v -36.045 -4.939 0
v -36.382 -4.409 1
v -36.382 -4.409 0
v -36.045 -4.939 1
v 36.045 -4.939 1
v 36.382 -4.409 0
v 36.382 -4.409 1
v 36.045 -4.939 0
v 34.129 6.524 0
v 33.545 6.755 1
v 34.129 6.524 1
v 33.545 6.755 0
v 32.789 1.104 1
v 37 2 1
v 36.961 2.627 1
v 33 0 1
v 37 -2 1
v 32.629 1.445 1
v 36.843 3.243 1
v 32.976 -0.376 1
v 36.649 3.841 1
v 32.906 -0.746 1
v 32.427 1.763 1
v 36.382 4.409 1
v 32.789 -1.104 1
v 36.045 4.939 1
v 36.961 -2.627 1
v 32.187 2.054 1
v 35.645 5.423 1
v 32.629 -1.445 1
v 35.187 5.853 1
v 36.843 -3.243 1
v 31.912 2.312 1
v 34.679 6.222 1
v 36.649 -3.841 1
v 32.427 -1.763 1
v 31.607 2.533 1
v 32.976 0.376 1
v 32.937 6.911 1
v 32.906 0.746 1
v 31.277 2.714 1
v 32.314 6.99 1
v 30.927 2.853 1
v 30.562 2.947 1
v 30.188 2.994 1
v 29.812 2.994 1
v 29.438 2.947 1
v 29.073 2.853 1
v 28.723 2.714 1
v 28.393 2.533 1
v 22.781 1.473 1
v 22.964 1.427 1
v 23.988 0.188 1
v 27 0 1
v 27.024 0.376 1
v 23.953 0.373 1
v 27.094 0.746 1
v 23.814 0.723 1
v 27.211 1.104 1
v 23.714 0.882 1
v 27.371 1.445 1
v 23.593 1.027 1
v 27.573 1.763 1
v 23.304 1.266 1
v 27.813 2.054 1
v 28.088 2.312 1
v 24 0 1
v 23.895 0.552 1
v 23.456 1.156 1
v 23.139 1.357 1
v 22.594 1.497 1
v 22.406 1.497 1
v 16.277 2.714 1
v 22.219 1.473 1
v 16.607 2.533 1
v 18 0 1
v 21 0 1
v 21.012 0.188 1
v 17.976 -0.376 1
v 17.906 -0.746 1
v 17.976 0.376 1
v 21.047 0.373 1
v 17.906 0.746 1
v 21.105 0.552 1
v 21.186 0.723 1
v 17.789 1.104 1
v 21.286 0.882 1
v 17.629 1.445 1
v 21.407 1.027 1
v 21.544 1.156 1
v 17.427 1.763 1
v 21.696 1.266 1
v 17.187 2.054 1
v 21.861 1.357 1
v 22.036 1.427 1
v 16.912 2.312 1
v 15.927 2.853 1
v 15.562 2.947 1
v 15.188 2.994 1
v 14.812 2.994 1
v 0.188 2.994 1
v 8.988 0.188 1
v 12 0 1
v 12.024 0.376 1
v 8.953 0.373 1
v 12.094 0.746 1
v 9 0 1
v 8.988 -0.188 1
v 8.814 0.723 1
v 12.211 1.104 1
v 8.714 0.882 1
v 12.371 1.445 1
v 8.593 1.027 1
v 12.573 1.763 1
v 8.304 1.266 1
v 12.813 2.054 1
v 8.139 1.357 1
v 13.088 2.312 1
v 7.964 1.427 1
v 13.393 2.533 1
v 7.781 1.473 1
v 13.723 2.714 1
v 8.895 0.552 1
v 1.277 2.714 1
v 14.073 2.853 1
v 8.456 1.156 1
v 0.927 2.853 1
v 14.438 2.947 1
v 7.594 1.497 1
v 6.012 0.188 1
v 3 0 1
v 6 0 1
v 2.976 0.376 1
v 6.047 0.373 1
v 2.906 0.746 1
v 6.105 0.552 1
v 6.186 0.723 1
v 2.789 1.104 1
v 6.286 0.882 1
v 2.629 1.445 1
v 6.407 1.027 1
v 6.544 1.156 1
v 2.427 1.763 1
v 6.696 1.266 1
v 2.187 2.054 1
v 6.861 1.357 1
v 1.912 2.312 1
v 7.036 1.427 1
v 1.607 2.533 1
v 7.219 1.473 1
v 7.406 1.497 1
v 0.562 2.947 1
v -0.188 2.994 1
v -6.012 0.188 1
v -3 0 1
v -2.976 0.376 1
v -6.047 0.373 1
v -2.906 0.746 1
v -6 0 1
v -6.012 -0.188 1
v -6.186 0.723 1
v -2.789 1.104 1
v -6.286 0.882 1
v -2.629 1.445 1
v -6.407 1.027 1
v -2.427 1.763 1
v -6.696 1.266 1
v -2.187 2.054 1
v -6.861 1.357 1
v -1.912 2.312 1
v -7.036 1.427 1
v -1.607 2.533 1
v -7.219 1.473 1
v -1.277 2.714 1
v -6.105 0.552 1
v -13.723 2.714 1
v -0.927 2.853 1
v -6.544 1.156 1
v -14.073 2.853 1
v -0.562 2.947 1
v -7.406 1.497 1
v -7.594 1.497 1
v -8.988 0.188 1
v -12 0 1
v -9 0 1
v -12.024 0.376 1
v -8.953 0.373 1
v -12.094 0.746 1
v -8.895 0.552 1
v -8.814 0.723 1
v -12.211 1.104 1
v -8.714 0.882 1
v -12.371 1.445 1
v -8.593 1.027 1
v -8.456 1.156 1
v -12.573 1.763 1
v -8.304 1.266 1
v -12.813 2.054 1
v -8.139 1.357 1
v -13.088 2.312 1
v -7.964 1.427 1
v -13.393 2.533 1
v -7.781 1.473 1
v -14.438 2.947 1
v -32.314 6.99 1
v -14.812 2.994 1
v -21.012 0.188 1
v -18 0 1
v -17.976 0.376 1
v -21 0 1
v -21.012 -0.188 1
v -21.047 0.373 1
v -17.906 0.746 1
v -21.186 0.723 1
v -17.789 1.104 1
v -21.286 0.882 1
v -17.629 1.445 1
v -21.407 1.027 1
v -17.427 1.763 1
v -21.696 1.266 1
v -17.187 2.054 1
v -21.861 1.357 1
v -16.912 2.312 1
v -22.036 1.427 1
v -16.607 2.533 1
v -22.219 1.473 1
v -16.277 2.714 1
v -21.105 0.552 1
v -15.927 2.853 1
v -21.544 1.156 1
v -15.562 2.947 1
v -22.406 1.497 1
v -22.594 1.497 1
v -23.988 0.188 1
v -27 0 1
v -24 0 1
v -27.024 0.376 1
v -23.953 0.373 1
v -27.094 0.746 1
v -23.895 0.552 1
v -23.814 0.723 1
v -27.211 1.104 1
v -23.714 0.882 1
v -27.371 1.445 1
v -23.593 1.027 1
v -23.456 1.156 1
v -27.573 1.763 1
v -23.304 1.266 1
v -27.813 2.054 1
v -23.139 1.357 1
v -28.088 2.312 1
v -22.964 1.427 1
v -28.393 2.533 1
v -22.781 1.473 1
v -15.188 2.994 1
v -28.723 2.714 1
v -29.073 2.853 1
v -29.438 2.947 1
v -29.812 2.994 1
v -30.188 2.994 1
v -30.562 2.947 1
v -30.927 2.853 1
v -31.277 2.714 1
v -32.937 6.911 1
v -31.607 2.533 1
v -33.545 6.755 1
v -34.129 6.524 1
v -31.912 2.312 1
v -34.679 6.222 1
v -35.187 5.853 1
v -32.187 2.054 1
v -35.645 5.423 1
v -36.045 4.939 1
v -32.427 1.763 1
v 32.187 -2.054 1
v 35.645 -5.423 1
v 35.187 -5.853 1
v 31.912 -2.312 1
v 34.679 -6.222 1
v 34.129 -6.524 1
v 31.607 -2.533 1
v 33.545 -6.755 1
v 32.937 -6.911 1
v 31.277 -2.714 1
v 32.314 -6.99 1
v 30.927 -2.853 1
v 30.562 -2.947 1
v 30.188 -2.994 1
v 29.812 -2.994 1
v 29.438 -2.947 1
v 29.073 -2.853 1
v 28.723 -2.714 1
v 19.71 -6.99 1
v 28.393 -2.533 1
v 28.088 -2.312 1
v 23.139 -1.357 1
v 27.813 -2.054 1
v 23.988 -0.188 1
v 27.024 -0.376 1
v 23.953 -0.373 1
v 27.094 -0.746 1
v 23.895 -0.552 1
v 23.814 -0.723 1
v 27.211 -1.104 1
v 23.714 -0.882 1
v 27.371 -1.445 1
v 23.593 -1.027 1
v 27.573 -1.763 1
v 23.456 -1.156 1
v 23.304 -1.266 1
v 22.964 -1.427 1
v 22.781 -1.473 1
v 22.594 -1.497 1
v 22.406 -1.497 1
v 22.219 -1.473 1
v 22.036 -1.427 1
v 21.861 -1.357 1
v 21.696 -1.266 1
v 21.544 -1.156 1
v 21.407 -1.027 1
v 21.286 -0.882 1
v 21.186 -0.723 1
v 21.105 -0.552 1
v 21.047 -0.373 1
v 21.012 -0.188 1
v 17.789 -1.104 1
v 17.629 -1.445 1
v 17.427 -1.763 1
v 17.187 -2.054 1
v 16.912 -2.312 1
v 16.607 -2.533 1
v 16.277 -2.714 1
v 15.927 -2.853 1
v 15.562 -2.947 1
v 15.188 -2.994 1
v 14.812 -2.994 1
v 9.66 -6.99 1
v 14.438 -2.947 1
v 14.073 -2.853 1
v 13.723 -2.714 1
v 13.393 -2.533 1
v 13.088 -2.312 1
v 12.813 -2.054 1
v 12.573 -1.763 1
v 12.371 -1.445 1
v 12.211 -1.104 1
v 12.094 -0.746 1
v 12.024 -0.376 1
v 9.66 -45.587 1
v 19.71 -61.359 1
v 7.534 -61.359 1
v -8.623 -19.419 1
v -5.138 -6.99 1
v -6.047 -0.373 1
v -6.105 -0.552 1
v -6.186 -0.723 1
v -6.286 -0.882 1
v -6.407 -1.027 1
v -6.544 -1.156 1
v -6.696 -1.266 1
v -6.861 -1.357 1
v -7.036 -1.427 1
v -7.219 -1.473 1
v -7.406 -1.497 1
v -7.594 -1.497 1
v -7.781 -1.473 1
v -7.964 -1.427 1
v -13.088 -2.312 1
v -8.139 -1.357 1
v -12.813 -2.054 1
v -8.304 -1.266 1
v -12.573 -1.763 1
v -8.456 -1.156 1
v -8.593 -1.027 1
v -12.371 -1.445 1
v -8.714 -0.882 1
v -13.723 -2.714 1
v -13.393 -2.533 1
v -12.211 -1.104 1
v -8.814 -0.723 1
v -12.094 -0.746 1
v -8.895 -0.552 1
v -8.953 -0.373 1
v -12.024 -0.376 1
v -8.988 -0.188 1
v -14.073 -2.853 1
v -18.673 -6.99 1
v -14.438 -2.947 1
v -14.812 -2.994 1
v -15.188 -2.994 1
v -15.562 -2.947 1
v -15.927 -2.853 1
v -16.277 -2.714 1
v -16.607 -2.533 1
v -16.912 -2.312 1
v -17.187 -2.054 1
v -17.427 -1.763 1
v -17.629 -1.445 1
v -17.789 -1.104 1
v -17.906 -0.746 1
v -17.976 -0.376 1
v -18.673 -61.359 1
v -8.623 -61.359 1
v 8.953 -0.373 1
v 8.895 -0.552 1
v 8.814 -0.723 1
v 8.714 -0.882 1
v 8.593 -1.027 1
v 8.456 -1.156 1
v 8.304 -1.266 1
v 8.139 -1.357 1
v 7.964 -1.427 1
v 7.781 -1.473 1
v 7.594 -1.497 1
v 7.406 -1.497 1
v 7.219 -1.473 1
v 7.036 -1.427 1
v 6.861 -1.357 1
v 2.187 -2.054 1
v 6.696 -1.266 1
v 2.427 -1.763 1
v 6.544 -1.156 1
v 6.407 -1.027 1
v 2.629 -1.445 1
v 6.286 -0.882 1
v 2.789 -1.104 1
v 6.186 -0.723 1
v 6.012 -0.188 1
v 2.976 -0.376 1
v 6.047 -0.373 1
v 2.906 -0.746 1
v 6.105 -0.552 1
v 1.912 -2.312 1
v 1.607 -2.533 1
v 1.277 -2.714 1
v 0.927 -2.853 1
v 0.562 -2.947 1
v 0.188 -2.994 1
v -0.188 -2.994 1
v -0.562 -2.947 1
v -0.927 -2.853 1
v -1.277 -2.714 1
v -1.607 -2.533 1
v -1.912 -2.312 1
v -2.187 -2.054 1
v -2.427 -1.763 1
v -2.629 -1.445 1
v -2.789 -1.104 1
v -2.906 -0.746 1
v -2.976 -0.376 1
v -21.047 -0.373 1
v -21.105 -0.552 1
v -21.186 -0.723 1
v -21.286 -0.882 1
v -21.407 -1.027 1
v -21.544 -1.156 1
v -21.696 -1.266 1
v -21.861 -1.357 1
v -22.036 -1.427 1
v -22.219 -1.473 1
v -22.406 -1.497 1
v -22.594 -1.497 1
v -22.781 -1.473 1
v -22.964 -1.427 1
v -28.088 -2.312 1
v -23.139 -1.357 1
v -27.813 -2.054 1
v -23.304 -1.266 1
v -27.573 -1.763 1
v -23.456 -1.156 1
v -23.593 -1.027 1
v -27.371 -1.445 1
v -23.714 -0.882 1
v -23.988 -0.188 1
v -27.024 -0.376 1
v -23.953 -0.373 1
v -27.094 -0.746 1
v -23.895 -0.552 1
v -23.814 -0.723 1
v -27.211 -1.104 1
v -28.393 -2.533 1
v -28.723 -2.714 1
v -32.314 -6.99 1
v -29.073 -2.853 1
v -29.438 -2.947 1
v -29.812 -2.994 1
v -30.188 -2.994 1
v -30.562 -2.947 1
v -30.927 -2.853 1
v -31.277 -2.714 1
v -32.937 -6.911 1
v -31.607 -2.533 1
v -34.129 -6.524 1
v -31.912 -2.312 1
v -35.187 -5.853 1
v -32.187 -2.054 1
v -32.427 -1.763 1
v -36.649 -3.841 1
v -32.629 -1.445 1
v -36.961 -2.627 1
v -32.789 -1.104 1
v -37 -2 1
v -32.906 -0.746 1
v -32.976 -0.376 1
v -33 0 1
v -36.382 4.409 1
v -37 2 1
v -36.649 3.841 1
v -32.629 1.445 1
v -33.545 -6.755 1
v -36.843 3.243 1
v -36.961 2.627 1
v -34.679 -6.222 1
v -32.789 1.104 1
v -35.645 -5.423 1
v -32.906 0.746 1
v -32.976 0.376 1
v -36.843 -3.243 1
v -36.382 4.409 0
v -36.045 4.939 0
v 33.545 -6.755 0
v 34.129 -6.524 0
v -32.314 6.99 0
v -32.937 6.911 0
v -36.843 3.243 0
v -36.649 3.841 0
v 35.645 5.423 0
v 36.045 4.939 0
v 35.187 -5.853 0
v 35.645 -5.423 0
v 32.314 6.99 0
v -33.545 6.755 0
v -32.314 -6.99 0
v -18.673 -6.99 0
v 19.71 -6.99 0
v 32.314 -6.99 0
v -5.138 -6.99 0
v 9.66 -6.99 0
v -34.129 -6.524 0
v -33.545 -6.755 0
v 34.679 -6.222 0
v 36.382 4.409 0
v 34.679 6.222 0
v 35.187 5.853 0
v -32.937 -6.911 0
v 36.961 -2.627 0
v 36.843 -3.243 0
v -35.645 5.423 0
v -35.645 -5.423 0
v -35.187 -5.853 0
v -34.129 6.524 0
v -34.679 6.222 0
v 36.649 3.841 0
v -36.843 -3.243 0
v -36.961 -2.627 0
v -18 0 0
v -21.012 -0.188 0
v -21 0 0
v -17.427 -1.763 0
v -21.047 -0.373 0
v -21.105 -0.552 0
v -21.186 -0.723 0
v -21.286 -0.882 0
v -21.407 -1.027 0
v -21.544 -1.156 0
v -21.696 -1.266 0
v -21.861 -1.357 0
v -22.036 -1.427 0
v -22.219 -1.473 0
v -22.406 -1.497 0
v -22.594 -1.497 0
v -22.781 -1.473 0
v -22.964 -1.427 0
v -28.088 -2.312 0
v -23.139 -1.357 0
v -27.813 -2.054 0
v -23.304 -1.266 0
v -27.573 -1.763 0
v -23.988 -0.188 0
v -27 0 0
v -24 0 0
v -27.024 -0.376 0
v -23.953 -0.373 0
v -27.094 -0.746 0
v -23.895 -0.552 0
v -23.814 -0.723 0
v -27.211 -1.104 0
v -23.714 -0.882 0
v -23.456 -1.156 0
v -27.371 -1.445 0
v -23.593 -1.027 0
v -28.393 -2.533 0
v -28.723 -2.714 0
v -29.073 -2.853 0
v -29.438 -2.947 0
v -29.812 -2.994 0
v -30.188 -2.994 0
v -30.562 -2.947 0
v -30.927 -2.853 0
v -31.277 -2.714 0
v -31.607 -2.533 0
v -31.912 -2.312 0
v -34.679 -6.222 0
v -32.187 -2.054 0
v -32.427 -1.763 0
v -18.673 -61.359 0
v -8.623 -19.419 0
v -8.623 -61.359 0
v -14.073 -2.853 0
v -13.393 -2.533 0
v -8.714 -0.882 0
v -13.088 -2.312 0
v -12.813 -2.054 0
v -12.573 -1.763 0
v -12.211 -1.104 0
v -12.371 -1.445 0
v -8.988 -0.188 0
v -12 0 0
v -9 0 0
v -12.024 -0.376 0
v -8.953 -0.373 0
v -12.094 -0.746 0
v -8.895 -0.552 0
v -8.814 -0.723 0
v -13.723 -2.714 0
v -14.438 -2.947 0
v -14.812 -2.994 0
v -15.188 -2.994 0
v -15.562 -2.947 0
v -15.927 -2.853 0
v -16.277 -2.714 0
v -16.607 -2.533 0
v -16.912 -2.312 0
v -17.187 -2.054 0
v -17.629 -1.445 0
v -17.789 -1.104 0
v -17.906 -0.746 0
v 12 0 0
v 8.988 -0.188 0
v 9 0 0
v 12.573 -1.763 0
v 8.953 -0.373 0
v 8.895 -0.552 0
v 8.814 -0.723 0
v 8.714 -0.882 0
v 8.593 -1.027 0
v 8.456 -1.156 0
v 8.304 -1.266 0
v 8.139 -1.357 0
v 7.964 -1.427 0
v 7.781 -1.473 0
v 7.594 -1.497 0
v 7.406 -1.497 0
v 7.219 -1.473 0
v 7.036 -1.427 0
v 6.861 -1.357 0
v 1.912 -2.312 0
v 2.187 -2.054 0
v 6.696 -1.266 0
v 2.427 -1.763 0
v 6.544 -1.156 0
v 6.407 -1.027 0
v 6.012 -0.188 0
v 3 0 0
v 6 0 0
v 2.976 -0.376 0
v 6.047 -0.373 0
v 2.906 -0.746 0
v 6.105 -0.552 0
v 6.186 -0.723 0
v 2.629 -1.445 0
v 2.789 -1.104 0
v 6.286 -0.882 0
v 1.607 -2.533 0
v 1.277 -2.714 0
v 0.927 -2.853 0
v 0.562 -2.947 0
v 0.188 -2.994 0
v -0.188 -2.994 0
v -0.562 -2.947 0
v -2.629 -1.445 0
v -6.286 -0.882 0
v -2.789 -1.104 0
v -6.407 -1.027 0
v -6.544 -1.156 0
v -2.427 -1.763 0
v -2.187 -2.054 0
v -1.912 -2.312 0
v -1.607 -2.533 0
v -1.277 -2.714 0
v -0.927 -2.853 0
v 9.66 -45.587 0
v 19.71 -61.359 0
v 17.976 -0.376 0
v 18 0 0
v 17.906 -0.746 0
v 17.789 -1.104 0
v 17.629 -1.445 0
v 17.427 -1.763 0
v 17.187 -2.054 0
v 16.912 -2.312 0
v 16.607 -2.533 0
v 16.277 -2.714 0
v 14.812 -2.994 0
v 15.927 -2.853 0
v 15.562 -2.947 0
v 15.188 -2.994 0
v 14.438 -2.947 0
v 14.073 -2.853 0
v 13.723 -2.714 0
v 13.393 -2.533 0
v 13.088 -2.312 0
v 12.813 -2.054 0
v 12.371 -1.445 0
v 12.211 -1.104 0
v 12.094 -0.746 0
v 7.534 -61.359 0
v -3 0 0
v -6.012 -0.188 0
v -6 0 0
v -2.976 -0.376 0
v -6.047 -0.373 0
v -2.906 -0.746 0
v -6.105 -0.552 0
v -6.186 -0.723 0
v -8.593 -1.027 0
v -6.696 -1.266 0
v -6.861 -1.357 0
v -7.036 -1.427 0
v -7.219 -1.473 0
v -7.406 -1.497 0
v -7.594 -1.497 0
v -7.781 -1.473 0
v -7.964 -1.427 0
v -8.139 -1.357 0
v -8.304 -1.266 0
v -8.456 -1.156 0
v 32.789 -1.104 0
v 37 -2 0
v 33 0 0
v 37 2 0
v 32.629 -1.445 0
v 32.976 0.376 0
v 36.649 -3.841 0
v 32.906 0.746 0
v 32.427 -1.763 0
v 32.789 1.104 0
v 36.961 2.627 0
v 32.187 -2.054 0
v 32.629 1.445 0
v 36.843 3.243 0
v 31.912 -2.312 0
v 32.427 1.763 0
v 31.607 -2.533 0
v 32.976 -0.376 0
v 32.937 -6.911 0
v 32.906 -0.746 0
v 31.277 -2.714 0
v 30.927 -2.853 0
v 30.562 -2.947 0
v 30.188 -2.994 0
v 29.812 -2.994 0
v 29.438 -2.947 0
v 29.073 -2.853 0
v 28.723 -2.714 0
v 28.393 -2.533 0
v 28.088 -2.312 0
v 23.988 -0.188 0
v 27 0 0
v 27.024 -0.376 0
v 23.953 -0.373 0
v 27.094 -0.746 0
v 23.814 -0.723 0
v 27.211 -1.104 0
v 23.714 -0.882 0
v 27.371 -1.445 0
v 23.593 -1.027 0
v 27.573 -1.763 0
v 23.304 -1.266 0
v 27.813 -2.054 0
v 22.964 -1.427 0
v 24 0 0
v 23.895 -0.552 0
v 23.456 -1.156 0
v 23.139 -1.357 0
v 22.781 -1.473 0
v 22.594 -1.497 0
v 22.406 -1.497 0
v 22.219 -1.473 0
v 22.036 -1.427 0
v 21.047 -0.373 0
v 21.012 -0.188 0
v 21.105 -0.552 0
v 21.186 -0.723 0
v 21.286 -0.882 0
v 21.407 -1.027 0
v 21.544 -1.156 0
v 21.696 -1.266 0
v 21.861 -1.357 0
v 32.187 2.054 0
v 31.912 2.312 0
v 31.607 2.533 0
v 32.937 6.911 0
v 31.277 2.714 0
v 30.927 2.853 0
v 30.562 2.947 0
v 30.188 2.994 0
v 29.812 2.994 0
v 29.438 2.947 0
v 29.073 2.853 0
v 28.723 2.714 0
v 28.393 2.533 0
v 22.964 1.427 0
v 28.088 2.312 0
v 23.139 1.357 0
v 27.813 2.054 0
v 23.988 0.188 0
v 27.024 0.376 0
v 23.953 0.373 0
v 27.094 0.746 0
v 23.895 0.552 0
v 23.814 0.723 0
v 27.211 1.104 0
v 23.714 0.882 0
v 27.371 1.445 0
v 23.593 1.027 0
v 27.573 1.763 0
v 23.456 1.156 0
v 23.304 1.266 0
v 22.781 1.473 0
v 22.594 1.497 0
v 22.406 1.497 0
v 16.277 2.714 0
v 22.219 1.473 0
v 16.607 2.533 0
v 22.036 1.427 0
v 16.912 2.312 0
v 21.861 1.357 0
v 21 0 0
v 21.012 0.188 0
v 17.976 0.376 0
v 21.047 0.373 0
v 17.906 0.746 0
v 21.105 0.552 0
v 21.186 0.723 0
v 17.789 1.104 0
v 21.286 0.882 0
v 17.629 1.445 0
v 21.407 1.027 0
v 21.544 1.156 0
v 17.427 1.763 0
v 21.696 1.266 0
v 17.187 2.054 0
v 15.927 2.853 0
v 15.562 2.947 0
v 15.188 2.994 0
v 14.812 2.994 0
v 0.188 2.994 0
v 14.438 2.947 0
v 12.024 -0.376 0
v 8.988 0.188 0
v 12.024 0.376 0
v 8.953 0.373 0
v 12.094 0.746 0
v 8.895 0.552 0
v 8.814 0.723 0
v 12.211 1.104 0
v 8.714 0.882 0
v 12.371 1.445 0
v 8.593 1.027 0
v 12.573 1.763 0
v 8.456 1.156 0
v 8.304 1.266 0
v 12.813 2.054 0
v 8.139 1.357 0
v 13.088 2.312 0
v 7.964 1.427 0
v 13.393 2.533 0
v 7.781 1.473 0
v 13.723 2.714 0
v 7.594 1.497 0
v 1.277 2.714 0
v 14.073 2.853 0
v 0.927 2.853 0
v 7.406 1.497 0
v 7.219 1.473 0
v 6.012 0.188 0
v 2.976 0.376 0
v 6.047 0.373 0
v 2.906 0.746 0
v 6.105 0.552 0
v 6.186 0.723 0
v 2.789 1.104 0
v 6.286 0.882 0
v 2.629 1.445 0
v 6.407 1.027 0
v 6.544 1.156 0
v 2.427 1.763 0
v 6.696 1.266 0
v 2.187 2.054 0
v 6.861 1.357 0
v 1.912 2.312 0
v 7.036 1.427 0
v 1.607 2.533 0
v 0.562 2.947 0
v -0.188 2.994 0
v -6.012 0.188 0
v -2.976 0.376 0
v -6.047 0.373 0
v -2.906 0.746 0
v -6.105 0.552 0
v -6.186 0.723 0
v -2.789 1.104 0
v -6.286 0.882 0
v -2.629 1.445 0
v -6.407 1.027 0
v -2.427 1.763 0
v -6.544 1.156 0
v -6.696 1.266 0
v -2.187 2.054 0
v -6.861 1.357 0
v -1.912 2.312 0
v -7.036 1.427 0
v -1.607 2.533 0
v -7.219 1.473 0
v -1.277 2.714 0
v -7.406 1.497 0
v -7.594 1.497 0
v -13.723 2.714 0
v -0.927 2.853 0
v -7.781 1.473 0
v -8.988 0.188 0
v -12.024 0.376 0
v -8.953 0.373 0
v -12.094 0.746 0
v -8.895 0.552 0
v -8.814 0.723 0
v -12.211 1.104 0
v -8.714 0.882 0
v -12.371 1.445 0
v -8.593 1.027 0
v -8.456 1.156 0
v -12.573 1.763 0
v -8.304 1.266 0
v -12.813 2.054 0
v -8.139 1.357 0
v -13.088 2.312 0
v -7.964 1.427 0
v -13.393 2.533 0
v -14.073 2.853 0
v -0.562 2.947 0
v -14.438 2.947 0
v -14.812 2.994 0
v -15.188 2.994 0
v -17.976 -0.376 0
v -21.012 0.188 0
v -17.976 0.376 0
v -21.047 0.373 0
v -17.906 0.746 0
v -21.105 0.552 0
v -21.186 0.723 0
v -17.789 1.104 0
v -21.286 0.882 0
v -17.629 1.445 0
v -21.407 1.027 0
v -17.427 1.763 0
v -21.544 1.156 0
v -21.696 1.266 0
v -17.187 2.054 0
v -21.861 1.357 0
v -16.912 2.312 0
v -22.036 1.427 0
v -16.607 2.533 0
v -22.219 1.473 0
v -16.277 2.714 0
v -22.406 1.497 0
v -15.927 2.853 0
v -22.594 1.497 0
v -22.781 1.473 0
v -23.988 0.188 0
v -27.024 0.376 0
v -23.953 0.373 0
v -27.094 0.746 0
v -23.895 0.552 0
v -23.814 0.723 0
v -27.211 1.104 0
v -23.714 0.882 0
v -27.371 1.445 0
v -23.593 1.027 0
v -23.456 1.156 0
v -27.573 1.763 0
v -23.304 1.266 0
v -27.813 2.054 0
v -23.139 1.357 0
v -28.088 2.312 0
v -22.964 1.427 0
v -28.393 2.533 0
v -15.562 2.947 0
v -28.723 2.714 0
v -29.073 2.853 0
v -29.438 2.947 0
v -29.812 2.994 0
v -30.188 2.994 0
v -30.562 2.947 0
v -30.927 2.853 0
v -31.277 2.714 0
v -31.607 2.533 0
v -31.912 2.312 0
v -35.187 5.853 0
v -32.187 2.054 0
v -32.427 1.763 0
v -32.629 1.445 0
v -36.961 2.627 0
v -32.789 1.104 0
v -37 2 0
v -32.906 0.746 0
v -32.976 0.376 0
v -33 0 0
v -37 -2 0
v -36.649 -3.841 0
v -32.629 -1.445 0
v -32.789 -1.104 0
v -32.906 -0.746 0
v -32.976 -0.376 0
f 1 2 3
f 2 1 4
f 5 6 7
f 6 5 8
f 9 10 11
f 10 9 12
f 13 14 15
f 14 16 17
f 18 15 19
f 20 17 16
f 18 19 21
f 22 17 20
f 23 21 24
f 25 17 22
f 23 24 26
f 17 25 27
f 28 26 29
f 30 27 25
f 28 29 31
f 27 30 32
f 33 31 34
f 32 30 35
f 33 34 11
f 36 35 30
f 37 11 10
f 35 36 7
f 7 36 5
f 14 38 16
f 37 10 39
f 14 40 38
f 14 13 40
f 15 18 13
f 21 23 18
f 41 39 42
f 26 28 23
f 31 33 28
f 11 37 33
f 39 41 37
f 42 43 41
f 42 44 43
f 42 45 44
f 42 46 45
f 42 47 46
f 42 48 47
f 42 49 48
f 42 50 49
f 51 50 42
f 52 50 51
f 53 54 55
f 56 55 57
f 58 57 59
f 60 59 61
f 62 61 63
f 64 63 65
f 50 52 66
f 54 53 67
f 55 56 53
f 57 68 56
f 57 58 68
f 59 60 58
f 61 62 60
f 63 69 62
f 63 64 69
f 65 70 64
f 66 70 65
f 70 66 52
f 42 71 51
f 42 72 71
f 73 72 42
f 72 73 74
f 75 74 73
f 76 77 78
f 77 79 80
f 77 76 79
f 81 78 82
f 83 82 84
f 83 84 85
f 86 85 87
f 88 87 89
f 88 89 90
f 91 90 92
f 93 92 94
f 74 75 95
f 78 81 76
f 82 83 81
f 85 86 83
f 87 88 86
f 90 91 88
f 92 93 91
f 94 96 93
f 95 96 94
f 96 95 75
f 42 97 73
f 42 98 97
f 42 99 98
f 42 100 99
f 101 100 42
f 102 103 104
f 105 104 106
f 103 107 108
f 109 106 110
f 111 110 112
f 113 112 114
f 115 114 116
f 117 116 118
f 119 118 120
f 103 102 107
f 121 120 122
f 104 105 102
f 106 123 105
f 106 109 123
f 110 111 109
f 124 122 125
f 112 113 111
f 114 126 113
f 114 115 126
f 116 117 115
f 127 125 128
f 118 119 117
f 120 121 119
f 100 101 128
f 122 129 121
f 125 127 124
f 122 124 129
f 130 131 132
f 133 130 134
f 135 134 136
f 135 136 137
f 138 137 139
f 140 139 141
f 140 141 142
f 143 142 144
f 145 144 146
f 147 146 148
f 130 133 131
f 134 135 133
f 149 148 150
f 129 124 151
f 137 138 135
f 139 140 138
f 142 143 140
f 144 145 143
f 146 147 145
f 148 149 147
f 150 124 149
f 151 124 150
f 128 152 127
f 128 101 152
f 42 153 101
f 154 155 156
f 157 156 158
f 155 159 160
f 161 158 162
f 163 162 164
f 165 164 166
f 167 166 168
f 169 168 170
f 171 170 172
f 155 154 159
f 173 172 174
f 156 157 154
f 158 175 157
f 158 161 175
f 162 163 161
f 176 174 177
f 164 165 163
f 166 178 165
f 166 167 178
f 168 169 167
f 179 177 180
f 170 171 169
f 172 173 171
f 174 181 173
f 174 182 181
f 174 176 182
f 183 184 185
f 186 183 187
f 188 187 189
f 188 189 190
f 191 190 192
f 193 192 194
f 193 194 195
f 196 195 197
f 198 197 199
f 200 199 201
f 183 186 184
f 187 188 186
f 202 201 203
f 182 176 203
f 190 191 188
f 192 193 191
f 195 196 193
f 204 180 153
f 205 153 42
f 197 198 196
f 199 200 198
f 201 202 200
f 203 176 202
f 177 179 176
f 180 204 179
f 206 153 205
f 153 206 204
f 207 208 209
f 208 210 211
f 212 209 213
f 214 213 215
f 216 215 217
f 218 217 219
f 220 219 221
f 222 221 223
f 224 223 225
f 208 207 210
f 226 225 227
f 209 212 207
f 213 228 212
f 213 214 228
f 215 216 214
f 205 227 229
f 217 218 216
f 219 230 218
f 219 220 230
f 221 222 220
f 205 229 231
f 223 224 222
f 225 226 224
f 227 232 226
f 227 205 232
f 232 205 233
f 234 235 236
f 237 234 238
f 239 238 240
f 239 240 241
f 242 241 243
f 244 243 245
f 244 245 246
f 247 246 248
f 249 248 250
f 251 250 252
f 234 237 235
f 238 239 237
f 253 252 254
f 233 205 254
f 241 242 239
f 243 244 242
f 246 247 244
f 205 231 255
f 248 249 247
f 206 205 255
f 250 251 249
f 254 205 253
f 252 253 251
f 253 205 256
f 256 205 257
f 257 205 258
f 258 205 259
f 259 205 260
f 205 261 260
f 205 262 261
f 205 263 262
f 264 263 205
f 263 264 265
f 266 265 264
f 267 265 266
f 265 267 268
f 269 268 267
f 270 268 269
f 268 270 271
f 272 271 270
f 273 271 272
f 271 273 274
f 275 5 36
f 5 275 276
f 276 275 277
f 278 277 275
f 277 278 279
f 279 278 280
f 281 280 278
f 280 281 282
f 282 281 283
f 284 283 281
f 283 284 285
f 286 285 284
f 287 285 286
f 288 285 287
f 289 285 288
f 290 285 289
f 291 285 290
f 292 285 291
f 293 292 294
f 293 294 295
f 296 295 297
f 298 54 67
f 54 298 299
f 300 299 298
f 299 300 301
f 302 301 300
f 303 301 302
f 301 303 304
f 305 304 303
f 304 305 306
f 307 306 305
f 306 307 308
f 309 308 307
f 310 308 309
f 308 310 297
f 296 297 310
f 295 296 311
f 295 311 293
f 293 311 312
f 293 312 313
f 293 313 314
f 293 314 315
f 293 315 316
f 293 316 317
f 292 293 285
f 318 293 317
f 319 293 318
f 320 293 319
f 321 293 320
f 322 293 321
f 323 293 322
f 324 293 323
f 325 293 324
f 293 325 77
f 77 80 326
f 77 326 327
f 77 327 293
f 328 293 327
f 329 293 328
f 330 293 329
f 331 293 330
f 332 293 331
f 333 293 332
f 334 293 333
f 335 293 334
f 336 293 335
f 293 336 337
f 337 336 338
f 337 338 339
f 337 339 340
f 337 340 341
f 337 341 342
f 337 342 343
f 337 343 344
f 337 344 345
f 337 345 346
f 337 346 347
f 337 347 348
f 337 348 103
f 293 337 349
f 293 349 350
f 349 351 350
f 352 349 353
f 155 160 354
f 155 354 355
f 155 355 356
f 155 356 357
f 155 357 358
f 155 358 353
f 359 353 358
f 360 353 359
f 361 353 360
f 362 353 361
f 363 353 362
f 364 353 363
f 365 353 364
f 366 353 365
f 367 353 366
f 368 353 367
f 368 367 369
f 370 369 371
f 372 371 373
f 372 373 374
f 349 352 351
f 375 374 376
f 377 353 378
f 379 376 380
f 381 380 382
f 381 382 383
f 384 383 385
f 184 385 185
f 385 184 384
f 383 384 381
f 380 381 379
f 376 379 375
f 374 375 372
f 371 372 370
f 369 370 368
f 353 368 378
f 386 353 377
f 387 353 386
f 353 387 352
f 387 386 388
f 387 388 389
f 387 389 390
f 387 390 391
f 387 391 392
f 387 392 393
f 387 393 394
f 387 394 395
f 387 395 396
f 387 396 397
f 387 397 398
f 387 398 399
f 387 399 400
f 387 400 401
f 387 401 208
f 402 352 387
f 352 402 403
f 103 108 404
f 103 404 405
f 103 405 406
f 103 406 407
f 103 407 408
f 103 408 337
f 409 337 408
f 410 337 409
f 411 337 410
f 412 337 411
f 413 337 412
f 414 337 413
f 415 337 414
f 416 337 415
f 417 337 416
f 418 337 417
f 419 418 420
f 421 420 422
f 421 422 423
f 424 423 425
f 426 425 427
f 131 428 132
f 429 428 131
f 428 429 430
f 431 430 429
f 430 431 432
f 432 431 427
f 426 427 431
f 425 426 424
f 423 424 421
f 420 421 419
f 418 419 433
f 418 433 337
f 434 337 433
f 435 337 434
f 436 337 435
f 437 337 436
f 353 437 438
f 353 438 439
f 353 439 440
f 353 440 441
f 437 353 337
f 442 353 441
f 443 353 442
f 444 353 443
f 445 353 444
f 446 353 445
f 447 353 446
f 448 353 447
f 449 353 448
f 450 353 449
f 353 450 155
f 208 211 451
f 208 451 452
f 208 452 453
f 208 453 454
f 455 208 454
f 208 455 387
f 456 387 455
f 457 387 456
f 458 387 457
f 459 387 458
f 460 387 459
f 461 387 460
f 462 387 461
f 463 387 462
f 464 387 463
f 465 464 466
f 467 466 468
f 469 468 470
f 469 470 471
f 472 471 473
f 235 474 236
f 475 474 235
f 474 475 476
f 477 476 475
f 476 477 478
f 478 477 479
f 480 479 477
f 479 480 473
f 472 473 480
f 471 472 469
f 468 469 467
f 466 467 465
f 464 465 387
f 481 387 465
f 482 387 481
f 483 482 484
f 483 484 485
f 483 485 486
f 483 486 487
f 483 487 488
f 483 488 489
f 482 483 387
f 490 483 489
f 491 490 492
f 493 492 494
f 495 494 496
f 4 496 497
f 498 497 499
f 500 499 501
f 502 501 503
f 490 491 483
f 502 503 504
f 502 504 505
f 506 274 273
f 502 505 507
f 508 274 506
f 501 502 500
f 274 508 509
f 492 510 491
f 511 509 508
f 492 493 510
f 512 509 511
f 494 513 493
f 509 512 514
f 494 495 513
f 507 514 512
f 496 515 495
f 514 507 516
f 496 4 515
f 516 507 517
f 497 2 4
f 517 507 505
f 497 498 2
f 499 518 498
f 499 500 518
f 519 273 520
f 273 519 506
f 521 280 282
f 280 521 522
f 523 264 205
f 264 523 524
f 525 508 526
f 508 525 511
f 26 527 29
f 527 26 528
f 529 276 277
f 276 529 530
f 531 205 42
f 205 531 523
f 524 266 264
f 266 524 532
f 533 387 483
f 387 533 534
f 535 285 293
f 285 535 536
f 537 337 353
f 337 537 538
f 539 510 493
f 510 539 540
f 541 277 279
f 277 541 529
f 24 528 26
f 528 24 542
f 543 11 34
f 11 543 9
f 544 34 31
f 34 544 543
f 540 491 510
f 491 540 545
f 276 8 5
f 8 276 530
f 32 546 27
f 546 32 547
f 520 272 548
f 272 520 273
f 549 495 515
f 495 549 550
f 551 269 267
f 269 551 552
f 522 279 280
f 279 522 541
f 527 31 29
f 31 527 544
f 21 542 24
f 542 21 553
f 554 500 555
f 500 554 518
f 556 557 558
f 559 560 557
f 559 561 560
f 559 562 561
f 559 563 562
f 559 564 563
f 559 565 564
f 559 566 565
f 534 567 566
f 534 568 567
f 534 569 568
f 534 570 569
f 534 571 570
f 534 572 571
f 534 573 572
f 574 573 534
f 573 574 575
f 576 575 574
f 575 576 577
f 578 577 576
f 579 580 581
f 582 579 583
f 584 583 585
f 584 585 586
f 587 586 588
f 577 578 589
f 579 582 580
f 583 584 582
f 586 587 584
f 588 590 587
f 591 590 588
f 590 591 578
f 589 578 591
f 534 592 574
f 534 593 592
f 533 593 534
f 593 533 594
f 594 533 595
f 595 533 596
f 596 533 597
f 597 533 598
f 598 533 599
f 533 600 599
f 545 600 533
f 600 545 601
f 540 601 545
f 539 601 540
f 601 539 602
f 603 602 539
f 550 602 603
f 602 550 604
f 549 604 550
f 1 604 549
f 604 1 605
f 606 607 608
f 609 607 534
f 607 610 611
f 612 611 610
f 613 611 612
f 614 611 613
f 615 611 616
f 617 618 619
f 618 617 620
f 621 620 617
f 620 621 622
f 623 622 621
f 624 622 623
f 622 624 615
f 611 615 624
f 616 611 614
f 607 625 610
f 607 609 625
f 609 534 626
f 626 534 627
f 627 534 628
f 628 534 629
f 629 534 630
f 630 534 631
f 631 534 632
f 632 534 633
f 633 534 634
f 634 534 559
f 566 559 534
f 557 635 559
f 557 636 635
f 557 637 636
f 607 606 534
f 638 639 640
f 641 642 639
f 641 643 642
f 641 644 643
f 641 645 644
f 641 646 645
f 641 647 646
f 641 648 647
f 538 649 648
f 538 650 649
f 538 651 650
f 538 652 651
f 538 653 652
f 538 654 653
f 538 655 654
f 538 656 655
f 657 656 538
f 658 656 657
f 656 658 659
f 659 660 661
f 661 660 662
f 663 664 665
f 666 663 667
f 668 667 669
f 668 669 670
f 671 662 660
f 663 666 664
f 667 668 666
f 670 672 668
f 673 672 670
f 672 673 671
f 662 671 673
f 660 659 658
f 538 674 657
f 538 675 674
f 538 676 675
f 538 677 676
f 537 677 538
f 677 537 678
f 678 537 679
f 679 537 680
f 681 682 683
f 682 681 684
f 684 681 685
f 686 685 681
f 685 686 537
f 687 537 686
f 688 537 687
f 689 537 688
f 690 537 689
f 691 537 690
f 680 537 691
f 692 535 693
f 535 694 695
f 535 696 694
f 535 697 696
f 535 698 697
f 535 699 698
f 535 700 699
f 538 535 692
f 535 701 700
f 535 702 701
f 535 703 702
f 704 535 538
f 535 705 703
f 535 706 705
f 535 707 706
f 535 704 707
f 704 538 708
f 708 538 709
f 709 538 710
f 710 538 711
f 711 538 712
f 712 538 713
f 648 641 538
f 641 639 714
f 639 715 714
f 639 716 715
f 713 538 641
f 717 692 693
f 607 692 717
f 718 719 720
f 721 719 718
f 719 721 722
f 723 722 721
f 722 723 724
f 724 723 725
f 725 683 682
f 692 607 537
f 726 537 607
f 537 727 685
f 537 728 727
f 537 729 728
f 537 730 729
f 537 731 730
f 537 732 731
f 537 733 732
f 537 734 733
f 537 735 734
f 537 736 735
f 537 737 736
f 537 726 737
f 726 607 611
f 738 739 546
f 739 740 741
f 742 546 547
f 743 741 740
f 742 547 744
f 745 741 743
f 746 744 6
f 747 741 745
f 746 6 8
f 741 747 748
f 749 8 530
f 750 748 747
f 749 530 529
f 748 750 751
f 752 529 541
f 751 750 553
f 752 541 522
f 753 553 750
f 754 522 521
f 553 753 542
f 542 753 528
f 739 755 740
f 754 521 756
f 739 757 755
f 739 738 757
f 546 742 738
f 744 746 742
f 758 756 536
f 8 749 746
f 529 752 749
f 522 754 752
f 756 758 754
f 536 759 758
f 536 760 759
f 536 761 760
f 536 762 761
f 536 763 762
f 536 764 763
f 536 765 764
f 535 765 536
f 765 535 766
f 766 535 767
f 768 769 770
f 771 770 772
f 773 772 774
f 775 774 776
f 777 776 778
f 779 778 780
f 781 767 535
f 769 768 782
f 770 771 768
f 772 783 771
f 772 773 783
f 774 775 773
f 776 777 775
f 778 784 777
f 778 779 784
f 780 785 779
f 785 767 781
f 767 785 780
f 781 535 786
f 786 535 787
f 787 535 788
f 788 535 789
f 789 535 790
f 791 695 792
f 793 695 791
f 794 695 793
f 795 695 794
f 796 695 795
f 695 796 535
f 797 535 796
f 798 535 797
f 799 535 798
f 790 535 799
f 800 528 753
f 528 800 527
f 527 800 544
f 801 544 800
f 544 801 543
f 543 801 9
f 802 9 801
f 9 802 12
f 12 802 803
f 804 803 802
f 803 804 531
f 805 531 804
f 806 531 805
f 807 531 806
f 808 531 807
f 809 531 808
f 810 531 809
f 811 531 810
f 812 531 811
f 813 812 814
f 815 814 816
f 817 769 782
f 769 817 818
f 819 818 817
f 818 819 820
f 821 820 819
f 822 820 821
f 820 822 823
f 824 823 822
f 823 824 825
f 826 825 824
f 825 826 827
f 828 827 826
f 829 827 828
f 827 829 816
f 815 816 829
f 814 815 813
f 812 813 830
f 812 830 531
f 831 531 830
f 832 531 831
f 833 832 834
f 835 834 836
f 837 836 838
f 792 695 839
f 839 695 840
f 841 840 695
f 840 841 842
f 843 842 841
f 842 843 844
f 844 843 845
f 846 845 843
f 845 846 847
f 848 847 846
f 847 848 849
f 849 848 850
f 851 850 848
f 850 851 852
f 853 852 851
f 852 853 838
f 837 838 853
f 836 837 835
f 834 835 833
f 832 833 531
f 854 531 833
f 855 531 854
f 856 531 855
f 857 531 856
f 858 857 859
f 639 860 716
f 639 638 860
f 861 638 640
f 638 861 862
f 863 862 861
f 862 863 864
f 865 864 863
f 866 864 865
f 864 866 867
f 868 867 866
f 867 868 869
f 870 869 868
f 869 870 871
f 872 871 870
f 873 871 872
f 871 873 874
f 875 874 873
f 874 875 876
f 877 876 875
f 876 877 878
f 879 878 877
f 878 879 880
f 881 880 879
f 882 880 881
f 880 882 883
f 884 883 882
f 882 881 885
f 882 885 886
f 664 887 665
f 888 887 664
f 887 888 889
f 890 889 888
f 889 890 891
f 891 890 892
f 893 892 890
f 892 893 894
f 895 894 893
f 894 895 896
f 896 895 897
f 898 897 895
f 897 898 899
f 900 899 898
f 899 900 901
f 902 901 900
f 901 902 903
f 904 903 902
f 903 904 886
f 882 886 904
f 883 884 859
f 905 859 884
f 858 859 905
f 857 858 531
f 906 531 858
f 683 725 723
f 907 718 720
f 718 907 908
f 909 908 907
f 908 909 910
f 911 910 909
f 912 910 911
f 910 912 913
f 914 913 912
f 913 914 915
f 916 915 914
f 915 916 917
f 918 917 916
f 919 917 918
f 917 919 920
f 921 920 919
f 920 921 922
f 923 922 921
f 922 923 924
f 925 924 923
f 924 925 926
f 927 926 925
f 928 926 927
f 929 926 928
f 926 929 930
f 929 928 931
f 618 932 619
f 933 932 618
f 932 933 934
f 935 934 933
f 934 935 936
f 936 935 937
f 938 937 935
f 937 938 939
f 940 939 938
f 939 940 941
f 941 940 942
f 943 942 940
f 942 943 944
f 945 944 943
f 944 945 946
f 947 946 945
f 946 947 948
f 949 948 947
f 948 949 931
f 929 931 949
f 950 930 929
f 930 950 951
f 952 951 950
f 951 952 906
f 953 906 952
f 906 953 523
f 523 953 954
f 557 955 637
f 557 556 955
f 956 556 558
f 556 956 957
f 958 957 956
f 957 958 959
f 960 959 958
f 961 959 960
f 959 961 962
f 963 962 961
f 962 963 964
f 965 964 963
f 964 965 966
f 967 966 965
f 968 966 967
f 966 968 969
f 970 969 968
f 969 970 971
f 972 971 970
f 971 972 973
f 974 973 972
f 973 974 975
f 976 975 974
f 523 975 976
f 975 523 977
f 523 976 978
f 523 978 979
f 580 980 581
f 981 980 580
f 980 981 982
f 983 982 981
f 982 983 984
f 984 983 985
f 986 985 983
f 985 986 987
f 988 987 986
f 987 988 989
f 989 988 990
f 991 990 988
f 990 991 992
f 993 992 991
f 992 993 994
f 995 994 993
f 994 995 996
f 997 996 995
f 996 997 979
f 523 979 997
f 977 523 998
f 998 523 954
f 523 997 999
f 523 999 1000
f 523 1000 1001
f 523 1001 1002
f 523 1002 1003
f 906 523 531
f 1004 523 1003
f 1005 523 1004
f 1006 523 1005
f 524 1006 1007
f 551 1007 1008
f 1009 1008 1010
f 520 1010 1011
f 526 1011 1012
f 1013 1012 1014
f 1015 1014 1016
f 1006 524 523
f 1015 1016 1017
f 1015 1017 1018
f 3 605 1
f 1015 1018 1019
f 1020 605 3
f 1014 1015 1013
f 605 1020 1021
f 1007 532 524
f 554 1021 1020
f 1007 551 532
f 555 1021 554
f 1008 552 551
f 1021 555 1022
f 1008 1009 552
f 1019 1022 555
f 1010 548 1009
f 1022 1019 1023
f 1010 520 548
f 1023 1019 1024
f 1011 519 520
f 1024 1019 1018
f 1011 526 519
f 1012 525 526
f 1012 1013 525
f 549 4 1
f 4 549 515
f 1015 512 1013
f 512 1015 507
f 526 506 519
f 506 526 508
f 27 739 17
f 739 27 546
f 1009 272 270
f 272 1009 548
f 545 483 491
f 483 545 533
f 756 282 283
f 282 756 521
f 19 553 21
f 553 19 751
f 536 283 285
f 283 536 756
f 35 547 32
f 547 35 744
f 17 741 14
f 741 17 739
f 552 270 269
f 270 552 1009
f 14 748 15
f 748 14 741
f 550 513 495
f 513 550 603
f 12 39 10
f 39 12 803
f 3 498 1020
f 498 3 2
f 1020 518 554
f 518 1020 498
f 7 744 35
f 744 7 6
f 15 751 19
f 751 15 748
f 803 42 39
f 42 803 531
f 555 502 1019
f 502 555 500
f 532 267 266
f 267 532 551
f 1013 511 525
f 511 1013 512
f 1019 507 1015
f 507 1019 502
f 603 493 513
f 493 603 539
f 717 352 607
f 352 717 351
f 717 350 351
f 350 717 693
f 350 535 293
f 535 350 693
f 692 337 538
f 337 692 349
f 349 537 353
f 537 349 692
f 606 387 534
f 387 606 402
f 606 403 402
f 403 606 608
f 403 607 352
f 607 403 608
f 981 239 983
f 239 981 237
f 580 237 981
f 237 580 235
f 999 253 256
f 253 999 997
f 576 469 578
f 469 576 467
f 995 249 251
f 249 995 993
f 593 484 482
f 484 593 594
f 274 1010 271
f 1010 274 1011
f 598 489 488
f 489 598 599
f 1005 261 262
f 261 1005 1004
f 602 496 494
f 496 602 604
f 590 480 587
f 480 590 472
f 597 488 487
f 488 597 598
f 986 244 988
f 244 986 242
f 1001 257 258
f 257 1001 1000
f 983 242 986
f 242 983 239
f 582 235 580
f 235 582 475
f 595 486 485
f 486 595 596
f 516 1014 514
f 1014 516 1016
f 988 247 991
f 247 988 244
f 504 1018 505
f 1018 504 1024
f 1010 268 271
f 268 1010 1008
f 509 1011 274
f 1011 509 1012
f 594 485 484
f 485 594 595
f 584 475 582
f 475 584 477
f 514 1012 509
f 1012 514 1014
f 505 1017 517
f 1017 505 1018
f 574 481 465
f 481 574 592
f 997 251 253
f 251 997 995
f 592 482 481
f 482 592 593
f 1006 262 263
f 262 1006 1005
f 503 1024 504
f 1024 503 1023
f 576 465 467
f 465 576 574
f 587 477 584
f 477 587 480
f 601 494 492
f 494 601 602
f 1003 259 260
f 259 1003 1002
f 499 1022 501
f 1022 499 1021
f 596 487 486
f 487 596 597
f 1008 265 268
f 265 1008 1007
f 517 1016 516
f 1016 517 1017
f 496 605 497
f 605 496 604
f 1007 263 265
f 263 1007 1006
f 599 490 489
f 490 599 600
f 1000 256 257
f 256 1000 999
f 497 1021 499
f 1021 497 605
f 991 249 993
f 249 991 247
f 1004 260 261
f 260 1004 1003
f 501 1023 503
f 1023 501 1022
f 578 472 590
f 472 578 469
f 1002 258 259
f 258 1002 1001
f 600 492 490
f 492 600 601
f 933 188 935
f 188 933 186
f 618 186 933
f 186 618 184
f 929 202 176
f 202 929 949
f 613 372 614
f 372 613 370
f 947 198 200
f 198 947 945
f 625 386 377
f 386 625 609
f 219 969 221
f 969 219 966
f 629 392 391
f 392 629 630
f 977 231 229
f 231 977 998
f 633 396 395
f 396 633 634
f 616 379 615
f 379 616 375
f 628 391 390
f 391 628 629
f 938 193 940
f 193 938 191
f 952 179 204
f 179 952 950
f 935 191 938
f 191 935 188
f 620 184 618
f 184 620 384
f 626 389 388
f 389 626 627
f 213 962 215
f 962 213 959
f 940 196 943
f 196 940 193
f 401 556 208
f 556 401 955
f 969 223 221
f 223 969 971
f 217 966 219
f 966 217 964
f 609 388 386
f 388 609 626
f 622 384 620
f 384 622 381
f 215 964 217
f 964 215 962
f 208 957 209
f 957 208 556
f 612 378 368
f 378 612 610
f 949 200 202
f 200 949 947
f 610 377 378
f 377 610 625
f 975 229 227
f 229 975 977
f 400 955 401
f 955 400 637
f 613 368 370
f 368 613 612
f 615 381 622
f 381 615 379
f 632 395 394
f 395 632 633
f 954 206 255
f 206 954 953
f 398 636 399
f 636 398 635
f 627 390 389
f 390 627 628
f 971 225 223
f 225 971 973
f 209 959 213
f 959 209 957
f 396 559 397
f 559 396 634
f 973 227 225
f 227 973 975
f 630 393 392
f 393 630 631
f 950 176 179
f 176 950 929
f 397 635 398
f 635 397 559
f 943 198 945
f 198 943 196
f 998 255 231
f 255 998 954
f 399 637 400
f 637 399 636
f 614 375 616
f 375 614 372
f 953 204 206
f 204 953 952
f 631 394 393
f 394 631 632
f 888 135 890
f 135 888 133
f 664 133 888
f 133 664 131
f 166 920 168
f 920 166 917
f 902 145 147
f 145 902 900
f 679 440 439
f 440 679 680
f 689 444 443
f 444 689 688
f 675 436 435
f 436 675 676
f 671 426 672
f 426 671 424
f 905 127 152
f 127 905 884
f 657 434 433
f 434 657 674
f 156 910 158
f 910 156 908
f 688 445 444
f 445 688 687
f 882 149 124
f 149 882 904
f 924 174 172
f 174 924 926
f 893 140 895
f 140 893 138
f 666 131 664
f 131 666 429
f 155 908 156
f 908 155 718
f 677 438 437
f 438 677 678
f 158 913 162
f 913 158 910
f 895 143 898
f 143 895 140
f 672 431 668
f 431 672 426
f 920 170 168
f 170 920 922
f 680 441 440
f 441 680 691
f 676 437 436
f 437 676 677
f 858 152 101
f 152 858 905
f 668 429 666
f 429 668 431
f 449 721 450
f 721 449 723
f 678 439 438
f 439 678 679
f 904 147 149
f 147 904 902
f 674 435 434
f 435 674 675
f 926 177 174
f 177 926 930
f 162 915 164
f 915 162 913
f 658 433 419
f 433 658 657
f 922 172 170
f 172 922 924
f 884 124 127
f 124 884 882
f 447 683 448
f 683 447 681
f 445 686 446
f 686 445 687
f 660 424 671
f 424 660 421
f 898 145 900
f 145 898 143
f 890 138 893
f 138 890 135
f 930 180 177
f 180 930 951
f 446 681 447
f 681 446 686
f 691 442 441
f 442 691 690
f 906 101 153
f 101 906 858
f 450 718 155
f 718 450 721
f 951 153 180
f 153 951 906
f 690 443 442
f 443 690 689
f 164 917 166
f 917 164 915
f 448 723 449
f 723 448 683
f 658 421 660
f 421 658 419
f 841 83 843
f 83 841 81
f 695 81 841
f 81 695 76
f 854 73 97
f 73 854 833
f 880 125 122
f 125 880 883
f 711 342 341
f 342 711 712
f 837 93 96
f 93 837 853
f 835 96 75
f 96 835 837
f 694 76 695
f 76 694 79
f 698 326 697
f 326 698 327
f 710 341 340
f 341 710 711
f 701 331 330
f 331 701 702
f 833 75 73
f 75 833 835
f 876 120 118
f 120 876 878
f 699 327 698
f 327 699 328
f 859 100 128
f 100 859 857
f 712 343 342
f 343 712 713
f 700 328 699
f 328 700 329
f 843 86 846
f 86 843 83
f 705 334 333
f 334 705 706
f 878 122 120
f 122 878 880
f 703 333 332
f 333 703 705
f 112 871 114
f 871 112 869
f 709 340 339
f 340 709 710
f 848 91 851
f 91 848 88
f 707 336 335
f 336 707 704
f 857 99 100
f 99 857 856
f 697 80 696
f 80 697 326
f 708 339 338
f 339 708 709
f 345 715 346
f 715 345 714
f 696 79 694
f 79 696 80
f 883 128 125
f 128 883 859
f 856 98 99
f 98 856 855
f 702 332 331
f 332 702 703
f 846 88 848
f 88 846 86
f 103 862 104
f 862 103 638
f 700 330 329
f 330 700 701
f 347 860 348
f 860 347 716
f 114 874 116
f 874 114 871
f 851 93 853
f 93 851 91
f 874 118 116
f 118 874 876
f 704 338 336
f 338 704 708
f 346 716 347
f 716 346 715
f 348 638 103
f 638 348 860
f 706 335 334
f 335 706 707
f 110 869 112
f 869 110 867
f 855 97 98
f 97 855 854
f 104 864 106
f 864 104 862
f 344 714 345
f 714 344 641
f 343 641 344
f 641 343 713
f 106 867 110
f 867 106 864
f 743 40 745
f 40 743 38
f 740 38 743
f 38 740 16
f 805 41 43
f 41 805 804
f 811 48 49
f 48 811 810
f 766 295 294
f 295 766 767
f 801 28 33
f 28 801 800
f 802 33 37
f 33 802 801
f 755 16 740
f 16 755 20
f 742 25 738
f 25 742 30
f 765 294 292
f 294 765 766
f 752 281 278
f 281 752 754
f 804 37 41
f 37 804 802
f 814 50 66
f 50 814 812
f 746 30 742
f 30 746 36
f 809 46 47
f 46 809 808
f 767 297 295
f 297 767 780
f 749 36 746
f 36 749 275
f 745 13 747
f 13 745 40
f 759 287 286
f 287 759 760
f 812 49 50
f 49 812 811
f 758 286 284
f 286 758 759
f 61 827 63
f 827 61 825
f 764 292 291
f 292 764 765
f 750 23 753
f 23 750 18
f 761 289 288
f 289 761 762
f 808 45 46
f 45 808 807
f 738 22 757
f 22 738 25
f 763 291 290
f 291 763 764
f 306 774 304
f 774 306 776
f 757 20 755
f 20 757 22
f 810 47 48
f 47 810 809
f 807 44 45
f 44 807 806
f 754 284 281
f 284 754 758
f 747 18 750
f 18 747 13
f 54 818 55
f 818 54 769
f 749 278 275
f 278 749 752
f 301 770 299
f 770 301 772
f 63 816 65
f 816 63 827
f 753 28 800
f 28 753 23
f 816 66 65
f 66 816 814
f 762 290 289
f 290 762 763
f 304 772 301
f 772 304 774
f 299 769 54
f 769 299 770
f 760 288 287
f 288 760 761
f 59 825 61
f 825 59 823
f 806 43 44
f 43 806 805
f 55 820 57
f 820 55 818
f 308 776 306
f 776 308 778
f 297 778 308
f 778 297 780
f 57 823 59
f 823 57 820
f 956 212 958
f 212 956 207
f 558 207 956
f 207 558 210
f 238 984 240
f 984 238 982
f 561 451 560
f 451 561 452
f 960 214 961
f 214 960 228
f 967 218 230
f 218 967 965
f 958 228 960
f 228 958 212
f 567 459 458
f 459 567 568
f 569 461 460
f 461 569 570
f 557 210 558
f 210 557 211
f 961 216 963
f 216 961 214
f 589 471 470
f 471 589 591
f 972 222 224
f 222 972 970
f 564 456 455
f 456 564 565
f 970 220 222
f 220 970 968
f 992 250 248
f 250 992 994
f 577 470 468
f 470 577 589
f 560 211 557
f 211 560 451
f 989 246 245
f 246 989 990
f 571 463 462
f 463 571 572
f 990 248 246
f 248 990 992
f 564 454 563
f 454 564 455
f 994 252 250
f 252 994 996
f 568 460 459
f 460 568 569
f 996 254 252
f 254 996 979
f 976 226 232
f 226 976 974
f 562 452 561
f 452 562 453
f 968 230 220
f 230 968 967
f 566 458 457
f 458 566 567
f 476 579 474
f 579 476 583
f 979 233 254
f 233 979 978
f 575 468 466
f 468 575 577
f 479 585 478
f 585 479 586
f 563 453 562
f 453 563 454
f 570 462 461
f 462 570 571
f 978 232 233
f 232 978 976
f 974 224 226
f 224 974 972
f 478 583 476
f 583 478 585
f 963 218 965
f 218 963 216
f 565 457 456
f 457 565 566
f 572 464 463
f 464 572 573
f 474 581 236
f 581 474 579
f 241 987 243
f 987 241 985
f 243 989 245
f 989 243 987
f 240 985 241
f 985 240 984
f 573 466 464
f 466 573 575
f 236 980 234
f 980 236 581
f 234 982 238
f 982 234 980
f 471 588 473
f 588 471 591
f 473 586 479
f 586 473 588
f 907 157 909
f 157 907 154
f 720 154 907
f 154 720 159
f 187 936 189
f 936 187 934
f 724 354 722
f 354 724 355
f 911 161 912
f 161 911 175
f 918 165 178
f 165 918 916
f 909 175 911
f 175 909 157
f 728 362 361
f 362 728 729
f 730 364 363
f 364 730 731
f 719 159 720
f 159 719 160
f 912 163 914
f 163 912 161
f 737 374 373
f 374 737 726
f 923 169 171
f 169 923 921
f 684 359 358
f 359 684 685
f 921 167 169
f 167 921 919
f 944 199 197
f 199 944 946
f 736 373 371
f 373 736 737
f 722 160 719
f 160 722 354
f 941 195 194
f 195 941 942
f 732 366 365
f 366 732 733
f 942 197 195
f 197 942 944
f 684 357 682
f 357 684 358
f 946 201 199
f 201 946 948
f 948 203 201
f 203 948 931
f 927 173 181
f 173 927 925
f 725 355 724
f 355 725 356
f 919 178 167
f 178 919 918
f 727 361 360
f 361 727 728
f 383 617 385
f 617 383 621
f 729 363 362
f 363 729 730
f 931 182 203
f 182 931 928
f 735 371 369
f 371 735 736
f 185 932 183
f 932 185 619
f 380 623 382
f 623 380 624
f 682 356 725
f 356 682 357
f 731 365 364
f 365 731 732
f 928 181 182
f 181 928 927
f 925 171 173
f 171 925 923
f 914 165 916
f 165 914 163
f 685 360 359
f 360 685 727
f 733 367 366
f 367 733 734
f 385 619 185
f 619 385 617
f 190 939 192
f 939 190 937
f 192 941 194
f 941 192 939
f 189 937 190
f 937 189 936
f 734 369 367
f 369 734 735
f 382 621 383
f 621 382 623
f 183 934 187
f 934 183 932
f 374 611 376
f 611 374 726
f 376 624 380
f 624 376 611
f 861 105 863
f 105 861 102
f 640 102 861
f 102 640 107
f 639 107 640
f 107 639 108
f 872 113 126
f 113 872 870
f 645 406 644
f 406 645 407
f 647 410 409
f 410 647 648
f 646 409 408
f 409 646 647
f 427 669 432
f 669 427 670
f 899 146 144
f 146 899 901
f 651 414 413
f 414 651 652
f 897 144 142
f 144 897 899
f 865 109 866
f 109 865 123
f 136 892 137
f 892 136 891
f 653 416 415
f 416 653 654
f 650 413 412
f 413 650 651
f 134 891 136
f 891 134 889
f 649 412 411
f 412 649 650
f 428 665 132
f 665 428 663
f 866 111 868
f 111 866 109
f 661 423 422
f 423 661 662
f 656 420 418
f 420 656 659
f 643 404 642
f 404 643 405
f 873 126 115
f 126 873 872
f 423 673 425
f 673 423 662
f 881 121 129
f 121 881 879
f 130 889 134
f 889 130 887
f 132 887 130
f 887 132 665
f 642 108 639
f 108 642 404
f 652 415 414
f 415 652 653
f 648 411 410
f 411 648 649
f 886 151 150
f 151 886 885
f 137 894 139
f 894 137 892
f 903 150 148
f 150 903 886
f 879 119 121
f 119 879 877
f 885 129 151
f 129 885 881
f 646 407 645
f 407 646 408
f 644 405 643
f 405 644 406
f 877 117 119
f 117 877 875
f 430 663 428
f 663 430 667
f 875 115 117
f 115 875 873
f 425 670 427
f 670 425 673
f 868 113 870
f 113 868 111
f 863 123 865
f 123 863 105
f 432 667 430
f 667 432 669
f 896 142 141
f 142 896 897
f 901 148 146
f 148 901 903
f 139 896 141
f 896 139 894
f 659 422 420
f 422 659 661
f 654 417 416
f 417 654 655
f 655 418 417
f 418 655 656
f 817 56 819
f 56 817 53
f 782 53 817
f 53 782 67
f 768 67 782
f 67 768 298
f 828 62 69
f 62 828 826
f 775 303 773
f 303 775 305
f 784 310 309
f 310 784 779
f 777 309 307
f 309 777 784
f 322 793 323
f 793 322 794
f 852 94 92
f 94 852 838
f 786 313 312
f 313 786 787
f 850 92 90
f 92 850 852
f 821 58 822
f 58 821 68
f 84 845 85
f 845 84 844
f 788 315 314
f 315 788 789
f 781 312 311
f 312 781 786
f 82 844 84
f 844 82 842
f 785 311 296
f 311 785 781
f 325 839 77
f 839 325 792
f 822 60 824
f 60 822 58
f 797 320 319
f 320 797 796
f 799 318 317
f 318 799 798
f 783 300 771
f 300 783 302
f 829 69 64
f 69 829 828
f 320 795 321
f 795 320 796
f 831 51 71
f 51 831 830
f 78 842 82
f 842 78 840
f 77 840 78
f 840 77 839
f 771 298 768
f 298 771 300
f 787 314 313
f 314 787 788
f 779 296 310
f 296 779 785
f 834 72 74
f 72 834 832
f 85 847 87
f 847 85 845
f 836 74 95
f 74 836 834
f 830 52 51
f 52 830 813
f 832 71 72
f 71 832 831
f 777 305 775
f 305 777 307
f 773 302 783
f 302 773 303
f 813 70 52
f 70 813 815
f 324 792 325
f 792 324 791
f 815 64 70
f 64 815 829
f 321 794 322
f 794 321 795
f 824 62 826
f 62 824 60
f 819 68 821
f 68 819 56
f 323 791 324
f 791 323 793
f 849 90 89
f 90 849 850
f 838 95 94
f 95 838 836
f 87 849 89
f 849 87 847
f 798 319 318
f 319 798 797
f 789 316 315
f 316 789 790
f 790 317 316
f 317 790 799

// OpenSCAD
$fn = 50;


difference() {
	union() {
		hull() {
			translate(v = [-32.0000000000, 2.0000000000, 0]) {
				cylinder(h = 1, r = 5);
			}
			translate(v = [32.0000000000, 2.0000000000, 0]) {
				cylinder(h = 1, r = 5);
			}
			translate(v = [-32.0000000000, -2.0000000000, 0]) {
				cylinder(h = 1, r = 5);
			}
			translate(v = [32.0000000000, -2.0000000000, 0]) {
				cylinder(h = 1, r = 5);
			}
		}
		translate(v = [0, -5, 0]) {
			linear_extrude(height = 1) {
				text(font = "DejaVu Sans Mono:style=Bold", halign = "center", size = 57.0000000000, text = "N", valign = "top");
			}
		}
	}
	union() {
		translate(v = [-30.0000000000, 0.0000000000, 0]) {
			translate(v = [0, 0, -100]) {
				cylinder(h = 200, r = 3.0000000000);
			}
		}
		translate(v = [-15.0000000000, 0.0000000000, 0]) {
			translate(v = [0, 0, -100]) {
				cylinder(h = 200, r = 3.0000000000);
			}
		}
		translate(v = [0, 0, -100]) {
			cylinder(h = 200, r = 3.0000000000);
		}
		translate(v = [15.0000000000, 0.0000000000, 0]) {
			translate(v = [0, 0, -100]) {
				cylinder(h = 200, r = 3.0000000000);
			}
		}
		translate(v = [30.0000000000, 0.0000000000, 0]) {
			translate(v = [0, 0, -100]) {
				cylinder(h = 200, r = 3.0000000000);
			}
		}
		translate(v = [-30.0000000000, 0.0000000000, 0]) {
			translate(v = [0, 0, -100]) {
				cylinder(h = 200, r = 1.5000000000);
			}
		}
		translate(v = [-22.5000000000, 0.0000000000, 0]) {
			translate(v = [0, 0, -100]) {
				cylinder(h = 200, r = 1.5000000000);
			}
		}
		translate(v = [-15.0000000000, 0.0000000000, 0]) {
			translate(v = [0, 0, -100]) {
				cylinder(h = 200, r = 1.5000000000);
			}
		}
		translate(v = [-7.5000000000, 0.0000000000, 0]) {
			translate(v = [0, 0, -100]) {
				cylinder(h = 200, r = 1.5000000000);
			}
		}
		translate(v = [0, 0, -100]) {
			cylinder(h = 200, r = 1.5000000000);
		}
		translate(v = [7.5000000000, 0.0000000000, 0]) {
			translate(v = [0, 0, -100]) {
				cylinder(h = 200, r = 1.5000000000);
			}
		}
		translate(v = [15.0000000000, 0.0000000000, 0]) {
			translate(v = [0, 0, -100]) {
				cylinder(h = 200, r = 1.5000000000);
			}
		}
		translate(v = [22.5000000000, 0.0000000000, 0]) {
			translate(v = [0, 0, -100]) {
				cylinder(h = 200, r = 1.5000000000);
			}
		}
		translate(v = [30.0000000000, 0.0000000000, 0]) {
			translate(v = [0, 0, -100]) {
				cylinder(h = 200, r = 1.5000000000);
			}
		}
	}
}
